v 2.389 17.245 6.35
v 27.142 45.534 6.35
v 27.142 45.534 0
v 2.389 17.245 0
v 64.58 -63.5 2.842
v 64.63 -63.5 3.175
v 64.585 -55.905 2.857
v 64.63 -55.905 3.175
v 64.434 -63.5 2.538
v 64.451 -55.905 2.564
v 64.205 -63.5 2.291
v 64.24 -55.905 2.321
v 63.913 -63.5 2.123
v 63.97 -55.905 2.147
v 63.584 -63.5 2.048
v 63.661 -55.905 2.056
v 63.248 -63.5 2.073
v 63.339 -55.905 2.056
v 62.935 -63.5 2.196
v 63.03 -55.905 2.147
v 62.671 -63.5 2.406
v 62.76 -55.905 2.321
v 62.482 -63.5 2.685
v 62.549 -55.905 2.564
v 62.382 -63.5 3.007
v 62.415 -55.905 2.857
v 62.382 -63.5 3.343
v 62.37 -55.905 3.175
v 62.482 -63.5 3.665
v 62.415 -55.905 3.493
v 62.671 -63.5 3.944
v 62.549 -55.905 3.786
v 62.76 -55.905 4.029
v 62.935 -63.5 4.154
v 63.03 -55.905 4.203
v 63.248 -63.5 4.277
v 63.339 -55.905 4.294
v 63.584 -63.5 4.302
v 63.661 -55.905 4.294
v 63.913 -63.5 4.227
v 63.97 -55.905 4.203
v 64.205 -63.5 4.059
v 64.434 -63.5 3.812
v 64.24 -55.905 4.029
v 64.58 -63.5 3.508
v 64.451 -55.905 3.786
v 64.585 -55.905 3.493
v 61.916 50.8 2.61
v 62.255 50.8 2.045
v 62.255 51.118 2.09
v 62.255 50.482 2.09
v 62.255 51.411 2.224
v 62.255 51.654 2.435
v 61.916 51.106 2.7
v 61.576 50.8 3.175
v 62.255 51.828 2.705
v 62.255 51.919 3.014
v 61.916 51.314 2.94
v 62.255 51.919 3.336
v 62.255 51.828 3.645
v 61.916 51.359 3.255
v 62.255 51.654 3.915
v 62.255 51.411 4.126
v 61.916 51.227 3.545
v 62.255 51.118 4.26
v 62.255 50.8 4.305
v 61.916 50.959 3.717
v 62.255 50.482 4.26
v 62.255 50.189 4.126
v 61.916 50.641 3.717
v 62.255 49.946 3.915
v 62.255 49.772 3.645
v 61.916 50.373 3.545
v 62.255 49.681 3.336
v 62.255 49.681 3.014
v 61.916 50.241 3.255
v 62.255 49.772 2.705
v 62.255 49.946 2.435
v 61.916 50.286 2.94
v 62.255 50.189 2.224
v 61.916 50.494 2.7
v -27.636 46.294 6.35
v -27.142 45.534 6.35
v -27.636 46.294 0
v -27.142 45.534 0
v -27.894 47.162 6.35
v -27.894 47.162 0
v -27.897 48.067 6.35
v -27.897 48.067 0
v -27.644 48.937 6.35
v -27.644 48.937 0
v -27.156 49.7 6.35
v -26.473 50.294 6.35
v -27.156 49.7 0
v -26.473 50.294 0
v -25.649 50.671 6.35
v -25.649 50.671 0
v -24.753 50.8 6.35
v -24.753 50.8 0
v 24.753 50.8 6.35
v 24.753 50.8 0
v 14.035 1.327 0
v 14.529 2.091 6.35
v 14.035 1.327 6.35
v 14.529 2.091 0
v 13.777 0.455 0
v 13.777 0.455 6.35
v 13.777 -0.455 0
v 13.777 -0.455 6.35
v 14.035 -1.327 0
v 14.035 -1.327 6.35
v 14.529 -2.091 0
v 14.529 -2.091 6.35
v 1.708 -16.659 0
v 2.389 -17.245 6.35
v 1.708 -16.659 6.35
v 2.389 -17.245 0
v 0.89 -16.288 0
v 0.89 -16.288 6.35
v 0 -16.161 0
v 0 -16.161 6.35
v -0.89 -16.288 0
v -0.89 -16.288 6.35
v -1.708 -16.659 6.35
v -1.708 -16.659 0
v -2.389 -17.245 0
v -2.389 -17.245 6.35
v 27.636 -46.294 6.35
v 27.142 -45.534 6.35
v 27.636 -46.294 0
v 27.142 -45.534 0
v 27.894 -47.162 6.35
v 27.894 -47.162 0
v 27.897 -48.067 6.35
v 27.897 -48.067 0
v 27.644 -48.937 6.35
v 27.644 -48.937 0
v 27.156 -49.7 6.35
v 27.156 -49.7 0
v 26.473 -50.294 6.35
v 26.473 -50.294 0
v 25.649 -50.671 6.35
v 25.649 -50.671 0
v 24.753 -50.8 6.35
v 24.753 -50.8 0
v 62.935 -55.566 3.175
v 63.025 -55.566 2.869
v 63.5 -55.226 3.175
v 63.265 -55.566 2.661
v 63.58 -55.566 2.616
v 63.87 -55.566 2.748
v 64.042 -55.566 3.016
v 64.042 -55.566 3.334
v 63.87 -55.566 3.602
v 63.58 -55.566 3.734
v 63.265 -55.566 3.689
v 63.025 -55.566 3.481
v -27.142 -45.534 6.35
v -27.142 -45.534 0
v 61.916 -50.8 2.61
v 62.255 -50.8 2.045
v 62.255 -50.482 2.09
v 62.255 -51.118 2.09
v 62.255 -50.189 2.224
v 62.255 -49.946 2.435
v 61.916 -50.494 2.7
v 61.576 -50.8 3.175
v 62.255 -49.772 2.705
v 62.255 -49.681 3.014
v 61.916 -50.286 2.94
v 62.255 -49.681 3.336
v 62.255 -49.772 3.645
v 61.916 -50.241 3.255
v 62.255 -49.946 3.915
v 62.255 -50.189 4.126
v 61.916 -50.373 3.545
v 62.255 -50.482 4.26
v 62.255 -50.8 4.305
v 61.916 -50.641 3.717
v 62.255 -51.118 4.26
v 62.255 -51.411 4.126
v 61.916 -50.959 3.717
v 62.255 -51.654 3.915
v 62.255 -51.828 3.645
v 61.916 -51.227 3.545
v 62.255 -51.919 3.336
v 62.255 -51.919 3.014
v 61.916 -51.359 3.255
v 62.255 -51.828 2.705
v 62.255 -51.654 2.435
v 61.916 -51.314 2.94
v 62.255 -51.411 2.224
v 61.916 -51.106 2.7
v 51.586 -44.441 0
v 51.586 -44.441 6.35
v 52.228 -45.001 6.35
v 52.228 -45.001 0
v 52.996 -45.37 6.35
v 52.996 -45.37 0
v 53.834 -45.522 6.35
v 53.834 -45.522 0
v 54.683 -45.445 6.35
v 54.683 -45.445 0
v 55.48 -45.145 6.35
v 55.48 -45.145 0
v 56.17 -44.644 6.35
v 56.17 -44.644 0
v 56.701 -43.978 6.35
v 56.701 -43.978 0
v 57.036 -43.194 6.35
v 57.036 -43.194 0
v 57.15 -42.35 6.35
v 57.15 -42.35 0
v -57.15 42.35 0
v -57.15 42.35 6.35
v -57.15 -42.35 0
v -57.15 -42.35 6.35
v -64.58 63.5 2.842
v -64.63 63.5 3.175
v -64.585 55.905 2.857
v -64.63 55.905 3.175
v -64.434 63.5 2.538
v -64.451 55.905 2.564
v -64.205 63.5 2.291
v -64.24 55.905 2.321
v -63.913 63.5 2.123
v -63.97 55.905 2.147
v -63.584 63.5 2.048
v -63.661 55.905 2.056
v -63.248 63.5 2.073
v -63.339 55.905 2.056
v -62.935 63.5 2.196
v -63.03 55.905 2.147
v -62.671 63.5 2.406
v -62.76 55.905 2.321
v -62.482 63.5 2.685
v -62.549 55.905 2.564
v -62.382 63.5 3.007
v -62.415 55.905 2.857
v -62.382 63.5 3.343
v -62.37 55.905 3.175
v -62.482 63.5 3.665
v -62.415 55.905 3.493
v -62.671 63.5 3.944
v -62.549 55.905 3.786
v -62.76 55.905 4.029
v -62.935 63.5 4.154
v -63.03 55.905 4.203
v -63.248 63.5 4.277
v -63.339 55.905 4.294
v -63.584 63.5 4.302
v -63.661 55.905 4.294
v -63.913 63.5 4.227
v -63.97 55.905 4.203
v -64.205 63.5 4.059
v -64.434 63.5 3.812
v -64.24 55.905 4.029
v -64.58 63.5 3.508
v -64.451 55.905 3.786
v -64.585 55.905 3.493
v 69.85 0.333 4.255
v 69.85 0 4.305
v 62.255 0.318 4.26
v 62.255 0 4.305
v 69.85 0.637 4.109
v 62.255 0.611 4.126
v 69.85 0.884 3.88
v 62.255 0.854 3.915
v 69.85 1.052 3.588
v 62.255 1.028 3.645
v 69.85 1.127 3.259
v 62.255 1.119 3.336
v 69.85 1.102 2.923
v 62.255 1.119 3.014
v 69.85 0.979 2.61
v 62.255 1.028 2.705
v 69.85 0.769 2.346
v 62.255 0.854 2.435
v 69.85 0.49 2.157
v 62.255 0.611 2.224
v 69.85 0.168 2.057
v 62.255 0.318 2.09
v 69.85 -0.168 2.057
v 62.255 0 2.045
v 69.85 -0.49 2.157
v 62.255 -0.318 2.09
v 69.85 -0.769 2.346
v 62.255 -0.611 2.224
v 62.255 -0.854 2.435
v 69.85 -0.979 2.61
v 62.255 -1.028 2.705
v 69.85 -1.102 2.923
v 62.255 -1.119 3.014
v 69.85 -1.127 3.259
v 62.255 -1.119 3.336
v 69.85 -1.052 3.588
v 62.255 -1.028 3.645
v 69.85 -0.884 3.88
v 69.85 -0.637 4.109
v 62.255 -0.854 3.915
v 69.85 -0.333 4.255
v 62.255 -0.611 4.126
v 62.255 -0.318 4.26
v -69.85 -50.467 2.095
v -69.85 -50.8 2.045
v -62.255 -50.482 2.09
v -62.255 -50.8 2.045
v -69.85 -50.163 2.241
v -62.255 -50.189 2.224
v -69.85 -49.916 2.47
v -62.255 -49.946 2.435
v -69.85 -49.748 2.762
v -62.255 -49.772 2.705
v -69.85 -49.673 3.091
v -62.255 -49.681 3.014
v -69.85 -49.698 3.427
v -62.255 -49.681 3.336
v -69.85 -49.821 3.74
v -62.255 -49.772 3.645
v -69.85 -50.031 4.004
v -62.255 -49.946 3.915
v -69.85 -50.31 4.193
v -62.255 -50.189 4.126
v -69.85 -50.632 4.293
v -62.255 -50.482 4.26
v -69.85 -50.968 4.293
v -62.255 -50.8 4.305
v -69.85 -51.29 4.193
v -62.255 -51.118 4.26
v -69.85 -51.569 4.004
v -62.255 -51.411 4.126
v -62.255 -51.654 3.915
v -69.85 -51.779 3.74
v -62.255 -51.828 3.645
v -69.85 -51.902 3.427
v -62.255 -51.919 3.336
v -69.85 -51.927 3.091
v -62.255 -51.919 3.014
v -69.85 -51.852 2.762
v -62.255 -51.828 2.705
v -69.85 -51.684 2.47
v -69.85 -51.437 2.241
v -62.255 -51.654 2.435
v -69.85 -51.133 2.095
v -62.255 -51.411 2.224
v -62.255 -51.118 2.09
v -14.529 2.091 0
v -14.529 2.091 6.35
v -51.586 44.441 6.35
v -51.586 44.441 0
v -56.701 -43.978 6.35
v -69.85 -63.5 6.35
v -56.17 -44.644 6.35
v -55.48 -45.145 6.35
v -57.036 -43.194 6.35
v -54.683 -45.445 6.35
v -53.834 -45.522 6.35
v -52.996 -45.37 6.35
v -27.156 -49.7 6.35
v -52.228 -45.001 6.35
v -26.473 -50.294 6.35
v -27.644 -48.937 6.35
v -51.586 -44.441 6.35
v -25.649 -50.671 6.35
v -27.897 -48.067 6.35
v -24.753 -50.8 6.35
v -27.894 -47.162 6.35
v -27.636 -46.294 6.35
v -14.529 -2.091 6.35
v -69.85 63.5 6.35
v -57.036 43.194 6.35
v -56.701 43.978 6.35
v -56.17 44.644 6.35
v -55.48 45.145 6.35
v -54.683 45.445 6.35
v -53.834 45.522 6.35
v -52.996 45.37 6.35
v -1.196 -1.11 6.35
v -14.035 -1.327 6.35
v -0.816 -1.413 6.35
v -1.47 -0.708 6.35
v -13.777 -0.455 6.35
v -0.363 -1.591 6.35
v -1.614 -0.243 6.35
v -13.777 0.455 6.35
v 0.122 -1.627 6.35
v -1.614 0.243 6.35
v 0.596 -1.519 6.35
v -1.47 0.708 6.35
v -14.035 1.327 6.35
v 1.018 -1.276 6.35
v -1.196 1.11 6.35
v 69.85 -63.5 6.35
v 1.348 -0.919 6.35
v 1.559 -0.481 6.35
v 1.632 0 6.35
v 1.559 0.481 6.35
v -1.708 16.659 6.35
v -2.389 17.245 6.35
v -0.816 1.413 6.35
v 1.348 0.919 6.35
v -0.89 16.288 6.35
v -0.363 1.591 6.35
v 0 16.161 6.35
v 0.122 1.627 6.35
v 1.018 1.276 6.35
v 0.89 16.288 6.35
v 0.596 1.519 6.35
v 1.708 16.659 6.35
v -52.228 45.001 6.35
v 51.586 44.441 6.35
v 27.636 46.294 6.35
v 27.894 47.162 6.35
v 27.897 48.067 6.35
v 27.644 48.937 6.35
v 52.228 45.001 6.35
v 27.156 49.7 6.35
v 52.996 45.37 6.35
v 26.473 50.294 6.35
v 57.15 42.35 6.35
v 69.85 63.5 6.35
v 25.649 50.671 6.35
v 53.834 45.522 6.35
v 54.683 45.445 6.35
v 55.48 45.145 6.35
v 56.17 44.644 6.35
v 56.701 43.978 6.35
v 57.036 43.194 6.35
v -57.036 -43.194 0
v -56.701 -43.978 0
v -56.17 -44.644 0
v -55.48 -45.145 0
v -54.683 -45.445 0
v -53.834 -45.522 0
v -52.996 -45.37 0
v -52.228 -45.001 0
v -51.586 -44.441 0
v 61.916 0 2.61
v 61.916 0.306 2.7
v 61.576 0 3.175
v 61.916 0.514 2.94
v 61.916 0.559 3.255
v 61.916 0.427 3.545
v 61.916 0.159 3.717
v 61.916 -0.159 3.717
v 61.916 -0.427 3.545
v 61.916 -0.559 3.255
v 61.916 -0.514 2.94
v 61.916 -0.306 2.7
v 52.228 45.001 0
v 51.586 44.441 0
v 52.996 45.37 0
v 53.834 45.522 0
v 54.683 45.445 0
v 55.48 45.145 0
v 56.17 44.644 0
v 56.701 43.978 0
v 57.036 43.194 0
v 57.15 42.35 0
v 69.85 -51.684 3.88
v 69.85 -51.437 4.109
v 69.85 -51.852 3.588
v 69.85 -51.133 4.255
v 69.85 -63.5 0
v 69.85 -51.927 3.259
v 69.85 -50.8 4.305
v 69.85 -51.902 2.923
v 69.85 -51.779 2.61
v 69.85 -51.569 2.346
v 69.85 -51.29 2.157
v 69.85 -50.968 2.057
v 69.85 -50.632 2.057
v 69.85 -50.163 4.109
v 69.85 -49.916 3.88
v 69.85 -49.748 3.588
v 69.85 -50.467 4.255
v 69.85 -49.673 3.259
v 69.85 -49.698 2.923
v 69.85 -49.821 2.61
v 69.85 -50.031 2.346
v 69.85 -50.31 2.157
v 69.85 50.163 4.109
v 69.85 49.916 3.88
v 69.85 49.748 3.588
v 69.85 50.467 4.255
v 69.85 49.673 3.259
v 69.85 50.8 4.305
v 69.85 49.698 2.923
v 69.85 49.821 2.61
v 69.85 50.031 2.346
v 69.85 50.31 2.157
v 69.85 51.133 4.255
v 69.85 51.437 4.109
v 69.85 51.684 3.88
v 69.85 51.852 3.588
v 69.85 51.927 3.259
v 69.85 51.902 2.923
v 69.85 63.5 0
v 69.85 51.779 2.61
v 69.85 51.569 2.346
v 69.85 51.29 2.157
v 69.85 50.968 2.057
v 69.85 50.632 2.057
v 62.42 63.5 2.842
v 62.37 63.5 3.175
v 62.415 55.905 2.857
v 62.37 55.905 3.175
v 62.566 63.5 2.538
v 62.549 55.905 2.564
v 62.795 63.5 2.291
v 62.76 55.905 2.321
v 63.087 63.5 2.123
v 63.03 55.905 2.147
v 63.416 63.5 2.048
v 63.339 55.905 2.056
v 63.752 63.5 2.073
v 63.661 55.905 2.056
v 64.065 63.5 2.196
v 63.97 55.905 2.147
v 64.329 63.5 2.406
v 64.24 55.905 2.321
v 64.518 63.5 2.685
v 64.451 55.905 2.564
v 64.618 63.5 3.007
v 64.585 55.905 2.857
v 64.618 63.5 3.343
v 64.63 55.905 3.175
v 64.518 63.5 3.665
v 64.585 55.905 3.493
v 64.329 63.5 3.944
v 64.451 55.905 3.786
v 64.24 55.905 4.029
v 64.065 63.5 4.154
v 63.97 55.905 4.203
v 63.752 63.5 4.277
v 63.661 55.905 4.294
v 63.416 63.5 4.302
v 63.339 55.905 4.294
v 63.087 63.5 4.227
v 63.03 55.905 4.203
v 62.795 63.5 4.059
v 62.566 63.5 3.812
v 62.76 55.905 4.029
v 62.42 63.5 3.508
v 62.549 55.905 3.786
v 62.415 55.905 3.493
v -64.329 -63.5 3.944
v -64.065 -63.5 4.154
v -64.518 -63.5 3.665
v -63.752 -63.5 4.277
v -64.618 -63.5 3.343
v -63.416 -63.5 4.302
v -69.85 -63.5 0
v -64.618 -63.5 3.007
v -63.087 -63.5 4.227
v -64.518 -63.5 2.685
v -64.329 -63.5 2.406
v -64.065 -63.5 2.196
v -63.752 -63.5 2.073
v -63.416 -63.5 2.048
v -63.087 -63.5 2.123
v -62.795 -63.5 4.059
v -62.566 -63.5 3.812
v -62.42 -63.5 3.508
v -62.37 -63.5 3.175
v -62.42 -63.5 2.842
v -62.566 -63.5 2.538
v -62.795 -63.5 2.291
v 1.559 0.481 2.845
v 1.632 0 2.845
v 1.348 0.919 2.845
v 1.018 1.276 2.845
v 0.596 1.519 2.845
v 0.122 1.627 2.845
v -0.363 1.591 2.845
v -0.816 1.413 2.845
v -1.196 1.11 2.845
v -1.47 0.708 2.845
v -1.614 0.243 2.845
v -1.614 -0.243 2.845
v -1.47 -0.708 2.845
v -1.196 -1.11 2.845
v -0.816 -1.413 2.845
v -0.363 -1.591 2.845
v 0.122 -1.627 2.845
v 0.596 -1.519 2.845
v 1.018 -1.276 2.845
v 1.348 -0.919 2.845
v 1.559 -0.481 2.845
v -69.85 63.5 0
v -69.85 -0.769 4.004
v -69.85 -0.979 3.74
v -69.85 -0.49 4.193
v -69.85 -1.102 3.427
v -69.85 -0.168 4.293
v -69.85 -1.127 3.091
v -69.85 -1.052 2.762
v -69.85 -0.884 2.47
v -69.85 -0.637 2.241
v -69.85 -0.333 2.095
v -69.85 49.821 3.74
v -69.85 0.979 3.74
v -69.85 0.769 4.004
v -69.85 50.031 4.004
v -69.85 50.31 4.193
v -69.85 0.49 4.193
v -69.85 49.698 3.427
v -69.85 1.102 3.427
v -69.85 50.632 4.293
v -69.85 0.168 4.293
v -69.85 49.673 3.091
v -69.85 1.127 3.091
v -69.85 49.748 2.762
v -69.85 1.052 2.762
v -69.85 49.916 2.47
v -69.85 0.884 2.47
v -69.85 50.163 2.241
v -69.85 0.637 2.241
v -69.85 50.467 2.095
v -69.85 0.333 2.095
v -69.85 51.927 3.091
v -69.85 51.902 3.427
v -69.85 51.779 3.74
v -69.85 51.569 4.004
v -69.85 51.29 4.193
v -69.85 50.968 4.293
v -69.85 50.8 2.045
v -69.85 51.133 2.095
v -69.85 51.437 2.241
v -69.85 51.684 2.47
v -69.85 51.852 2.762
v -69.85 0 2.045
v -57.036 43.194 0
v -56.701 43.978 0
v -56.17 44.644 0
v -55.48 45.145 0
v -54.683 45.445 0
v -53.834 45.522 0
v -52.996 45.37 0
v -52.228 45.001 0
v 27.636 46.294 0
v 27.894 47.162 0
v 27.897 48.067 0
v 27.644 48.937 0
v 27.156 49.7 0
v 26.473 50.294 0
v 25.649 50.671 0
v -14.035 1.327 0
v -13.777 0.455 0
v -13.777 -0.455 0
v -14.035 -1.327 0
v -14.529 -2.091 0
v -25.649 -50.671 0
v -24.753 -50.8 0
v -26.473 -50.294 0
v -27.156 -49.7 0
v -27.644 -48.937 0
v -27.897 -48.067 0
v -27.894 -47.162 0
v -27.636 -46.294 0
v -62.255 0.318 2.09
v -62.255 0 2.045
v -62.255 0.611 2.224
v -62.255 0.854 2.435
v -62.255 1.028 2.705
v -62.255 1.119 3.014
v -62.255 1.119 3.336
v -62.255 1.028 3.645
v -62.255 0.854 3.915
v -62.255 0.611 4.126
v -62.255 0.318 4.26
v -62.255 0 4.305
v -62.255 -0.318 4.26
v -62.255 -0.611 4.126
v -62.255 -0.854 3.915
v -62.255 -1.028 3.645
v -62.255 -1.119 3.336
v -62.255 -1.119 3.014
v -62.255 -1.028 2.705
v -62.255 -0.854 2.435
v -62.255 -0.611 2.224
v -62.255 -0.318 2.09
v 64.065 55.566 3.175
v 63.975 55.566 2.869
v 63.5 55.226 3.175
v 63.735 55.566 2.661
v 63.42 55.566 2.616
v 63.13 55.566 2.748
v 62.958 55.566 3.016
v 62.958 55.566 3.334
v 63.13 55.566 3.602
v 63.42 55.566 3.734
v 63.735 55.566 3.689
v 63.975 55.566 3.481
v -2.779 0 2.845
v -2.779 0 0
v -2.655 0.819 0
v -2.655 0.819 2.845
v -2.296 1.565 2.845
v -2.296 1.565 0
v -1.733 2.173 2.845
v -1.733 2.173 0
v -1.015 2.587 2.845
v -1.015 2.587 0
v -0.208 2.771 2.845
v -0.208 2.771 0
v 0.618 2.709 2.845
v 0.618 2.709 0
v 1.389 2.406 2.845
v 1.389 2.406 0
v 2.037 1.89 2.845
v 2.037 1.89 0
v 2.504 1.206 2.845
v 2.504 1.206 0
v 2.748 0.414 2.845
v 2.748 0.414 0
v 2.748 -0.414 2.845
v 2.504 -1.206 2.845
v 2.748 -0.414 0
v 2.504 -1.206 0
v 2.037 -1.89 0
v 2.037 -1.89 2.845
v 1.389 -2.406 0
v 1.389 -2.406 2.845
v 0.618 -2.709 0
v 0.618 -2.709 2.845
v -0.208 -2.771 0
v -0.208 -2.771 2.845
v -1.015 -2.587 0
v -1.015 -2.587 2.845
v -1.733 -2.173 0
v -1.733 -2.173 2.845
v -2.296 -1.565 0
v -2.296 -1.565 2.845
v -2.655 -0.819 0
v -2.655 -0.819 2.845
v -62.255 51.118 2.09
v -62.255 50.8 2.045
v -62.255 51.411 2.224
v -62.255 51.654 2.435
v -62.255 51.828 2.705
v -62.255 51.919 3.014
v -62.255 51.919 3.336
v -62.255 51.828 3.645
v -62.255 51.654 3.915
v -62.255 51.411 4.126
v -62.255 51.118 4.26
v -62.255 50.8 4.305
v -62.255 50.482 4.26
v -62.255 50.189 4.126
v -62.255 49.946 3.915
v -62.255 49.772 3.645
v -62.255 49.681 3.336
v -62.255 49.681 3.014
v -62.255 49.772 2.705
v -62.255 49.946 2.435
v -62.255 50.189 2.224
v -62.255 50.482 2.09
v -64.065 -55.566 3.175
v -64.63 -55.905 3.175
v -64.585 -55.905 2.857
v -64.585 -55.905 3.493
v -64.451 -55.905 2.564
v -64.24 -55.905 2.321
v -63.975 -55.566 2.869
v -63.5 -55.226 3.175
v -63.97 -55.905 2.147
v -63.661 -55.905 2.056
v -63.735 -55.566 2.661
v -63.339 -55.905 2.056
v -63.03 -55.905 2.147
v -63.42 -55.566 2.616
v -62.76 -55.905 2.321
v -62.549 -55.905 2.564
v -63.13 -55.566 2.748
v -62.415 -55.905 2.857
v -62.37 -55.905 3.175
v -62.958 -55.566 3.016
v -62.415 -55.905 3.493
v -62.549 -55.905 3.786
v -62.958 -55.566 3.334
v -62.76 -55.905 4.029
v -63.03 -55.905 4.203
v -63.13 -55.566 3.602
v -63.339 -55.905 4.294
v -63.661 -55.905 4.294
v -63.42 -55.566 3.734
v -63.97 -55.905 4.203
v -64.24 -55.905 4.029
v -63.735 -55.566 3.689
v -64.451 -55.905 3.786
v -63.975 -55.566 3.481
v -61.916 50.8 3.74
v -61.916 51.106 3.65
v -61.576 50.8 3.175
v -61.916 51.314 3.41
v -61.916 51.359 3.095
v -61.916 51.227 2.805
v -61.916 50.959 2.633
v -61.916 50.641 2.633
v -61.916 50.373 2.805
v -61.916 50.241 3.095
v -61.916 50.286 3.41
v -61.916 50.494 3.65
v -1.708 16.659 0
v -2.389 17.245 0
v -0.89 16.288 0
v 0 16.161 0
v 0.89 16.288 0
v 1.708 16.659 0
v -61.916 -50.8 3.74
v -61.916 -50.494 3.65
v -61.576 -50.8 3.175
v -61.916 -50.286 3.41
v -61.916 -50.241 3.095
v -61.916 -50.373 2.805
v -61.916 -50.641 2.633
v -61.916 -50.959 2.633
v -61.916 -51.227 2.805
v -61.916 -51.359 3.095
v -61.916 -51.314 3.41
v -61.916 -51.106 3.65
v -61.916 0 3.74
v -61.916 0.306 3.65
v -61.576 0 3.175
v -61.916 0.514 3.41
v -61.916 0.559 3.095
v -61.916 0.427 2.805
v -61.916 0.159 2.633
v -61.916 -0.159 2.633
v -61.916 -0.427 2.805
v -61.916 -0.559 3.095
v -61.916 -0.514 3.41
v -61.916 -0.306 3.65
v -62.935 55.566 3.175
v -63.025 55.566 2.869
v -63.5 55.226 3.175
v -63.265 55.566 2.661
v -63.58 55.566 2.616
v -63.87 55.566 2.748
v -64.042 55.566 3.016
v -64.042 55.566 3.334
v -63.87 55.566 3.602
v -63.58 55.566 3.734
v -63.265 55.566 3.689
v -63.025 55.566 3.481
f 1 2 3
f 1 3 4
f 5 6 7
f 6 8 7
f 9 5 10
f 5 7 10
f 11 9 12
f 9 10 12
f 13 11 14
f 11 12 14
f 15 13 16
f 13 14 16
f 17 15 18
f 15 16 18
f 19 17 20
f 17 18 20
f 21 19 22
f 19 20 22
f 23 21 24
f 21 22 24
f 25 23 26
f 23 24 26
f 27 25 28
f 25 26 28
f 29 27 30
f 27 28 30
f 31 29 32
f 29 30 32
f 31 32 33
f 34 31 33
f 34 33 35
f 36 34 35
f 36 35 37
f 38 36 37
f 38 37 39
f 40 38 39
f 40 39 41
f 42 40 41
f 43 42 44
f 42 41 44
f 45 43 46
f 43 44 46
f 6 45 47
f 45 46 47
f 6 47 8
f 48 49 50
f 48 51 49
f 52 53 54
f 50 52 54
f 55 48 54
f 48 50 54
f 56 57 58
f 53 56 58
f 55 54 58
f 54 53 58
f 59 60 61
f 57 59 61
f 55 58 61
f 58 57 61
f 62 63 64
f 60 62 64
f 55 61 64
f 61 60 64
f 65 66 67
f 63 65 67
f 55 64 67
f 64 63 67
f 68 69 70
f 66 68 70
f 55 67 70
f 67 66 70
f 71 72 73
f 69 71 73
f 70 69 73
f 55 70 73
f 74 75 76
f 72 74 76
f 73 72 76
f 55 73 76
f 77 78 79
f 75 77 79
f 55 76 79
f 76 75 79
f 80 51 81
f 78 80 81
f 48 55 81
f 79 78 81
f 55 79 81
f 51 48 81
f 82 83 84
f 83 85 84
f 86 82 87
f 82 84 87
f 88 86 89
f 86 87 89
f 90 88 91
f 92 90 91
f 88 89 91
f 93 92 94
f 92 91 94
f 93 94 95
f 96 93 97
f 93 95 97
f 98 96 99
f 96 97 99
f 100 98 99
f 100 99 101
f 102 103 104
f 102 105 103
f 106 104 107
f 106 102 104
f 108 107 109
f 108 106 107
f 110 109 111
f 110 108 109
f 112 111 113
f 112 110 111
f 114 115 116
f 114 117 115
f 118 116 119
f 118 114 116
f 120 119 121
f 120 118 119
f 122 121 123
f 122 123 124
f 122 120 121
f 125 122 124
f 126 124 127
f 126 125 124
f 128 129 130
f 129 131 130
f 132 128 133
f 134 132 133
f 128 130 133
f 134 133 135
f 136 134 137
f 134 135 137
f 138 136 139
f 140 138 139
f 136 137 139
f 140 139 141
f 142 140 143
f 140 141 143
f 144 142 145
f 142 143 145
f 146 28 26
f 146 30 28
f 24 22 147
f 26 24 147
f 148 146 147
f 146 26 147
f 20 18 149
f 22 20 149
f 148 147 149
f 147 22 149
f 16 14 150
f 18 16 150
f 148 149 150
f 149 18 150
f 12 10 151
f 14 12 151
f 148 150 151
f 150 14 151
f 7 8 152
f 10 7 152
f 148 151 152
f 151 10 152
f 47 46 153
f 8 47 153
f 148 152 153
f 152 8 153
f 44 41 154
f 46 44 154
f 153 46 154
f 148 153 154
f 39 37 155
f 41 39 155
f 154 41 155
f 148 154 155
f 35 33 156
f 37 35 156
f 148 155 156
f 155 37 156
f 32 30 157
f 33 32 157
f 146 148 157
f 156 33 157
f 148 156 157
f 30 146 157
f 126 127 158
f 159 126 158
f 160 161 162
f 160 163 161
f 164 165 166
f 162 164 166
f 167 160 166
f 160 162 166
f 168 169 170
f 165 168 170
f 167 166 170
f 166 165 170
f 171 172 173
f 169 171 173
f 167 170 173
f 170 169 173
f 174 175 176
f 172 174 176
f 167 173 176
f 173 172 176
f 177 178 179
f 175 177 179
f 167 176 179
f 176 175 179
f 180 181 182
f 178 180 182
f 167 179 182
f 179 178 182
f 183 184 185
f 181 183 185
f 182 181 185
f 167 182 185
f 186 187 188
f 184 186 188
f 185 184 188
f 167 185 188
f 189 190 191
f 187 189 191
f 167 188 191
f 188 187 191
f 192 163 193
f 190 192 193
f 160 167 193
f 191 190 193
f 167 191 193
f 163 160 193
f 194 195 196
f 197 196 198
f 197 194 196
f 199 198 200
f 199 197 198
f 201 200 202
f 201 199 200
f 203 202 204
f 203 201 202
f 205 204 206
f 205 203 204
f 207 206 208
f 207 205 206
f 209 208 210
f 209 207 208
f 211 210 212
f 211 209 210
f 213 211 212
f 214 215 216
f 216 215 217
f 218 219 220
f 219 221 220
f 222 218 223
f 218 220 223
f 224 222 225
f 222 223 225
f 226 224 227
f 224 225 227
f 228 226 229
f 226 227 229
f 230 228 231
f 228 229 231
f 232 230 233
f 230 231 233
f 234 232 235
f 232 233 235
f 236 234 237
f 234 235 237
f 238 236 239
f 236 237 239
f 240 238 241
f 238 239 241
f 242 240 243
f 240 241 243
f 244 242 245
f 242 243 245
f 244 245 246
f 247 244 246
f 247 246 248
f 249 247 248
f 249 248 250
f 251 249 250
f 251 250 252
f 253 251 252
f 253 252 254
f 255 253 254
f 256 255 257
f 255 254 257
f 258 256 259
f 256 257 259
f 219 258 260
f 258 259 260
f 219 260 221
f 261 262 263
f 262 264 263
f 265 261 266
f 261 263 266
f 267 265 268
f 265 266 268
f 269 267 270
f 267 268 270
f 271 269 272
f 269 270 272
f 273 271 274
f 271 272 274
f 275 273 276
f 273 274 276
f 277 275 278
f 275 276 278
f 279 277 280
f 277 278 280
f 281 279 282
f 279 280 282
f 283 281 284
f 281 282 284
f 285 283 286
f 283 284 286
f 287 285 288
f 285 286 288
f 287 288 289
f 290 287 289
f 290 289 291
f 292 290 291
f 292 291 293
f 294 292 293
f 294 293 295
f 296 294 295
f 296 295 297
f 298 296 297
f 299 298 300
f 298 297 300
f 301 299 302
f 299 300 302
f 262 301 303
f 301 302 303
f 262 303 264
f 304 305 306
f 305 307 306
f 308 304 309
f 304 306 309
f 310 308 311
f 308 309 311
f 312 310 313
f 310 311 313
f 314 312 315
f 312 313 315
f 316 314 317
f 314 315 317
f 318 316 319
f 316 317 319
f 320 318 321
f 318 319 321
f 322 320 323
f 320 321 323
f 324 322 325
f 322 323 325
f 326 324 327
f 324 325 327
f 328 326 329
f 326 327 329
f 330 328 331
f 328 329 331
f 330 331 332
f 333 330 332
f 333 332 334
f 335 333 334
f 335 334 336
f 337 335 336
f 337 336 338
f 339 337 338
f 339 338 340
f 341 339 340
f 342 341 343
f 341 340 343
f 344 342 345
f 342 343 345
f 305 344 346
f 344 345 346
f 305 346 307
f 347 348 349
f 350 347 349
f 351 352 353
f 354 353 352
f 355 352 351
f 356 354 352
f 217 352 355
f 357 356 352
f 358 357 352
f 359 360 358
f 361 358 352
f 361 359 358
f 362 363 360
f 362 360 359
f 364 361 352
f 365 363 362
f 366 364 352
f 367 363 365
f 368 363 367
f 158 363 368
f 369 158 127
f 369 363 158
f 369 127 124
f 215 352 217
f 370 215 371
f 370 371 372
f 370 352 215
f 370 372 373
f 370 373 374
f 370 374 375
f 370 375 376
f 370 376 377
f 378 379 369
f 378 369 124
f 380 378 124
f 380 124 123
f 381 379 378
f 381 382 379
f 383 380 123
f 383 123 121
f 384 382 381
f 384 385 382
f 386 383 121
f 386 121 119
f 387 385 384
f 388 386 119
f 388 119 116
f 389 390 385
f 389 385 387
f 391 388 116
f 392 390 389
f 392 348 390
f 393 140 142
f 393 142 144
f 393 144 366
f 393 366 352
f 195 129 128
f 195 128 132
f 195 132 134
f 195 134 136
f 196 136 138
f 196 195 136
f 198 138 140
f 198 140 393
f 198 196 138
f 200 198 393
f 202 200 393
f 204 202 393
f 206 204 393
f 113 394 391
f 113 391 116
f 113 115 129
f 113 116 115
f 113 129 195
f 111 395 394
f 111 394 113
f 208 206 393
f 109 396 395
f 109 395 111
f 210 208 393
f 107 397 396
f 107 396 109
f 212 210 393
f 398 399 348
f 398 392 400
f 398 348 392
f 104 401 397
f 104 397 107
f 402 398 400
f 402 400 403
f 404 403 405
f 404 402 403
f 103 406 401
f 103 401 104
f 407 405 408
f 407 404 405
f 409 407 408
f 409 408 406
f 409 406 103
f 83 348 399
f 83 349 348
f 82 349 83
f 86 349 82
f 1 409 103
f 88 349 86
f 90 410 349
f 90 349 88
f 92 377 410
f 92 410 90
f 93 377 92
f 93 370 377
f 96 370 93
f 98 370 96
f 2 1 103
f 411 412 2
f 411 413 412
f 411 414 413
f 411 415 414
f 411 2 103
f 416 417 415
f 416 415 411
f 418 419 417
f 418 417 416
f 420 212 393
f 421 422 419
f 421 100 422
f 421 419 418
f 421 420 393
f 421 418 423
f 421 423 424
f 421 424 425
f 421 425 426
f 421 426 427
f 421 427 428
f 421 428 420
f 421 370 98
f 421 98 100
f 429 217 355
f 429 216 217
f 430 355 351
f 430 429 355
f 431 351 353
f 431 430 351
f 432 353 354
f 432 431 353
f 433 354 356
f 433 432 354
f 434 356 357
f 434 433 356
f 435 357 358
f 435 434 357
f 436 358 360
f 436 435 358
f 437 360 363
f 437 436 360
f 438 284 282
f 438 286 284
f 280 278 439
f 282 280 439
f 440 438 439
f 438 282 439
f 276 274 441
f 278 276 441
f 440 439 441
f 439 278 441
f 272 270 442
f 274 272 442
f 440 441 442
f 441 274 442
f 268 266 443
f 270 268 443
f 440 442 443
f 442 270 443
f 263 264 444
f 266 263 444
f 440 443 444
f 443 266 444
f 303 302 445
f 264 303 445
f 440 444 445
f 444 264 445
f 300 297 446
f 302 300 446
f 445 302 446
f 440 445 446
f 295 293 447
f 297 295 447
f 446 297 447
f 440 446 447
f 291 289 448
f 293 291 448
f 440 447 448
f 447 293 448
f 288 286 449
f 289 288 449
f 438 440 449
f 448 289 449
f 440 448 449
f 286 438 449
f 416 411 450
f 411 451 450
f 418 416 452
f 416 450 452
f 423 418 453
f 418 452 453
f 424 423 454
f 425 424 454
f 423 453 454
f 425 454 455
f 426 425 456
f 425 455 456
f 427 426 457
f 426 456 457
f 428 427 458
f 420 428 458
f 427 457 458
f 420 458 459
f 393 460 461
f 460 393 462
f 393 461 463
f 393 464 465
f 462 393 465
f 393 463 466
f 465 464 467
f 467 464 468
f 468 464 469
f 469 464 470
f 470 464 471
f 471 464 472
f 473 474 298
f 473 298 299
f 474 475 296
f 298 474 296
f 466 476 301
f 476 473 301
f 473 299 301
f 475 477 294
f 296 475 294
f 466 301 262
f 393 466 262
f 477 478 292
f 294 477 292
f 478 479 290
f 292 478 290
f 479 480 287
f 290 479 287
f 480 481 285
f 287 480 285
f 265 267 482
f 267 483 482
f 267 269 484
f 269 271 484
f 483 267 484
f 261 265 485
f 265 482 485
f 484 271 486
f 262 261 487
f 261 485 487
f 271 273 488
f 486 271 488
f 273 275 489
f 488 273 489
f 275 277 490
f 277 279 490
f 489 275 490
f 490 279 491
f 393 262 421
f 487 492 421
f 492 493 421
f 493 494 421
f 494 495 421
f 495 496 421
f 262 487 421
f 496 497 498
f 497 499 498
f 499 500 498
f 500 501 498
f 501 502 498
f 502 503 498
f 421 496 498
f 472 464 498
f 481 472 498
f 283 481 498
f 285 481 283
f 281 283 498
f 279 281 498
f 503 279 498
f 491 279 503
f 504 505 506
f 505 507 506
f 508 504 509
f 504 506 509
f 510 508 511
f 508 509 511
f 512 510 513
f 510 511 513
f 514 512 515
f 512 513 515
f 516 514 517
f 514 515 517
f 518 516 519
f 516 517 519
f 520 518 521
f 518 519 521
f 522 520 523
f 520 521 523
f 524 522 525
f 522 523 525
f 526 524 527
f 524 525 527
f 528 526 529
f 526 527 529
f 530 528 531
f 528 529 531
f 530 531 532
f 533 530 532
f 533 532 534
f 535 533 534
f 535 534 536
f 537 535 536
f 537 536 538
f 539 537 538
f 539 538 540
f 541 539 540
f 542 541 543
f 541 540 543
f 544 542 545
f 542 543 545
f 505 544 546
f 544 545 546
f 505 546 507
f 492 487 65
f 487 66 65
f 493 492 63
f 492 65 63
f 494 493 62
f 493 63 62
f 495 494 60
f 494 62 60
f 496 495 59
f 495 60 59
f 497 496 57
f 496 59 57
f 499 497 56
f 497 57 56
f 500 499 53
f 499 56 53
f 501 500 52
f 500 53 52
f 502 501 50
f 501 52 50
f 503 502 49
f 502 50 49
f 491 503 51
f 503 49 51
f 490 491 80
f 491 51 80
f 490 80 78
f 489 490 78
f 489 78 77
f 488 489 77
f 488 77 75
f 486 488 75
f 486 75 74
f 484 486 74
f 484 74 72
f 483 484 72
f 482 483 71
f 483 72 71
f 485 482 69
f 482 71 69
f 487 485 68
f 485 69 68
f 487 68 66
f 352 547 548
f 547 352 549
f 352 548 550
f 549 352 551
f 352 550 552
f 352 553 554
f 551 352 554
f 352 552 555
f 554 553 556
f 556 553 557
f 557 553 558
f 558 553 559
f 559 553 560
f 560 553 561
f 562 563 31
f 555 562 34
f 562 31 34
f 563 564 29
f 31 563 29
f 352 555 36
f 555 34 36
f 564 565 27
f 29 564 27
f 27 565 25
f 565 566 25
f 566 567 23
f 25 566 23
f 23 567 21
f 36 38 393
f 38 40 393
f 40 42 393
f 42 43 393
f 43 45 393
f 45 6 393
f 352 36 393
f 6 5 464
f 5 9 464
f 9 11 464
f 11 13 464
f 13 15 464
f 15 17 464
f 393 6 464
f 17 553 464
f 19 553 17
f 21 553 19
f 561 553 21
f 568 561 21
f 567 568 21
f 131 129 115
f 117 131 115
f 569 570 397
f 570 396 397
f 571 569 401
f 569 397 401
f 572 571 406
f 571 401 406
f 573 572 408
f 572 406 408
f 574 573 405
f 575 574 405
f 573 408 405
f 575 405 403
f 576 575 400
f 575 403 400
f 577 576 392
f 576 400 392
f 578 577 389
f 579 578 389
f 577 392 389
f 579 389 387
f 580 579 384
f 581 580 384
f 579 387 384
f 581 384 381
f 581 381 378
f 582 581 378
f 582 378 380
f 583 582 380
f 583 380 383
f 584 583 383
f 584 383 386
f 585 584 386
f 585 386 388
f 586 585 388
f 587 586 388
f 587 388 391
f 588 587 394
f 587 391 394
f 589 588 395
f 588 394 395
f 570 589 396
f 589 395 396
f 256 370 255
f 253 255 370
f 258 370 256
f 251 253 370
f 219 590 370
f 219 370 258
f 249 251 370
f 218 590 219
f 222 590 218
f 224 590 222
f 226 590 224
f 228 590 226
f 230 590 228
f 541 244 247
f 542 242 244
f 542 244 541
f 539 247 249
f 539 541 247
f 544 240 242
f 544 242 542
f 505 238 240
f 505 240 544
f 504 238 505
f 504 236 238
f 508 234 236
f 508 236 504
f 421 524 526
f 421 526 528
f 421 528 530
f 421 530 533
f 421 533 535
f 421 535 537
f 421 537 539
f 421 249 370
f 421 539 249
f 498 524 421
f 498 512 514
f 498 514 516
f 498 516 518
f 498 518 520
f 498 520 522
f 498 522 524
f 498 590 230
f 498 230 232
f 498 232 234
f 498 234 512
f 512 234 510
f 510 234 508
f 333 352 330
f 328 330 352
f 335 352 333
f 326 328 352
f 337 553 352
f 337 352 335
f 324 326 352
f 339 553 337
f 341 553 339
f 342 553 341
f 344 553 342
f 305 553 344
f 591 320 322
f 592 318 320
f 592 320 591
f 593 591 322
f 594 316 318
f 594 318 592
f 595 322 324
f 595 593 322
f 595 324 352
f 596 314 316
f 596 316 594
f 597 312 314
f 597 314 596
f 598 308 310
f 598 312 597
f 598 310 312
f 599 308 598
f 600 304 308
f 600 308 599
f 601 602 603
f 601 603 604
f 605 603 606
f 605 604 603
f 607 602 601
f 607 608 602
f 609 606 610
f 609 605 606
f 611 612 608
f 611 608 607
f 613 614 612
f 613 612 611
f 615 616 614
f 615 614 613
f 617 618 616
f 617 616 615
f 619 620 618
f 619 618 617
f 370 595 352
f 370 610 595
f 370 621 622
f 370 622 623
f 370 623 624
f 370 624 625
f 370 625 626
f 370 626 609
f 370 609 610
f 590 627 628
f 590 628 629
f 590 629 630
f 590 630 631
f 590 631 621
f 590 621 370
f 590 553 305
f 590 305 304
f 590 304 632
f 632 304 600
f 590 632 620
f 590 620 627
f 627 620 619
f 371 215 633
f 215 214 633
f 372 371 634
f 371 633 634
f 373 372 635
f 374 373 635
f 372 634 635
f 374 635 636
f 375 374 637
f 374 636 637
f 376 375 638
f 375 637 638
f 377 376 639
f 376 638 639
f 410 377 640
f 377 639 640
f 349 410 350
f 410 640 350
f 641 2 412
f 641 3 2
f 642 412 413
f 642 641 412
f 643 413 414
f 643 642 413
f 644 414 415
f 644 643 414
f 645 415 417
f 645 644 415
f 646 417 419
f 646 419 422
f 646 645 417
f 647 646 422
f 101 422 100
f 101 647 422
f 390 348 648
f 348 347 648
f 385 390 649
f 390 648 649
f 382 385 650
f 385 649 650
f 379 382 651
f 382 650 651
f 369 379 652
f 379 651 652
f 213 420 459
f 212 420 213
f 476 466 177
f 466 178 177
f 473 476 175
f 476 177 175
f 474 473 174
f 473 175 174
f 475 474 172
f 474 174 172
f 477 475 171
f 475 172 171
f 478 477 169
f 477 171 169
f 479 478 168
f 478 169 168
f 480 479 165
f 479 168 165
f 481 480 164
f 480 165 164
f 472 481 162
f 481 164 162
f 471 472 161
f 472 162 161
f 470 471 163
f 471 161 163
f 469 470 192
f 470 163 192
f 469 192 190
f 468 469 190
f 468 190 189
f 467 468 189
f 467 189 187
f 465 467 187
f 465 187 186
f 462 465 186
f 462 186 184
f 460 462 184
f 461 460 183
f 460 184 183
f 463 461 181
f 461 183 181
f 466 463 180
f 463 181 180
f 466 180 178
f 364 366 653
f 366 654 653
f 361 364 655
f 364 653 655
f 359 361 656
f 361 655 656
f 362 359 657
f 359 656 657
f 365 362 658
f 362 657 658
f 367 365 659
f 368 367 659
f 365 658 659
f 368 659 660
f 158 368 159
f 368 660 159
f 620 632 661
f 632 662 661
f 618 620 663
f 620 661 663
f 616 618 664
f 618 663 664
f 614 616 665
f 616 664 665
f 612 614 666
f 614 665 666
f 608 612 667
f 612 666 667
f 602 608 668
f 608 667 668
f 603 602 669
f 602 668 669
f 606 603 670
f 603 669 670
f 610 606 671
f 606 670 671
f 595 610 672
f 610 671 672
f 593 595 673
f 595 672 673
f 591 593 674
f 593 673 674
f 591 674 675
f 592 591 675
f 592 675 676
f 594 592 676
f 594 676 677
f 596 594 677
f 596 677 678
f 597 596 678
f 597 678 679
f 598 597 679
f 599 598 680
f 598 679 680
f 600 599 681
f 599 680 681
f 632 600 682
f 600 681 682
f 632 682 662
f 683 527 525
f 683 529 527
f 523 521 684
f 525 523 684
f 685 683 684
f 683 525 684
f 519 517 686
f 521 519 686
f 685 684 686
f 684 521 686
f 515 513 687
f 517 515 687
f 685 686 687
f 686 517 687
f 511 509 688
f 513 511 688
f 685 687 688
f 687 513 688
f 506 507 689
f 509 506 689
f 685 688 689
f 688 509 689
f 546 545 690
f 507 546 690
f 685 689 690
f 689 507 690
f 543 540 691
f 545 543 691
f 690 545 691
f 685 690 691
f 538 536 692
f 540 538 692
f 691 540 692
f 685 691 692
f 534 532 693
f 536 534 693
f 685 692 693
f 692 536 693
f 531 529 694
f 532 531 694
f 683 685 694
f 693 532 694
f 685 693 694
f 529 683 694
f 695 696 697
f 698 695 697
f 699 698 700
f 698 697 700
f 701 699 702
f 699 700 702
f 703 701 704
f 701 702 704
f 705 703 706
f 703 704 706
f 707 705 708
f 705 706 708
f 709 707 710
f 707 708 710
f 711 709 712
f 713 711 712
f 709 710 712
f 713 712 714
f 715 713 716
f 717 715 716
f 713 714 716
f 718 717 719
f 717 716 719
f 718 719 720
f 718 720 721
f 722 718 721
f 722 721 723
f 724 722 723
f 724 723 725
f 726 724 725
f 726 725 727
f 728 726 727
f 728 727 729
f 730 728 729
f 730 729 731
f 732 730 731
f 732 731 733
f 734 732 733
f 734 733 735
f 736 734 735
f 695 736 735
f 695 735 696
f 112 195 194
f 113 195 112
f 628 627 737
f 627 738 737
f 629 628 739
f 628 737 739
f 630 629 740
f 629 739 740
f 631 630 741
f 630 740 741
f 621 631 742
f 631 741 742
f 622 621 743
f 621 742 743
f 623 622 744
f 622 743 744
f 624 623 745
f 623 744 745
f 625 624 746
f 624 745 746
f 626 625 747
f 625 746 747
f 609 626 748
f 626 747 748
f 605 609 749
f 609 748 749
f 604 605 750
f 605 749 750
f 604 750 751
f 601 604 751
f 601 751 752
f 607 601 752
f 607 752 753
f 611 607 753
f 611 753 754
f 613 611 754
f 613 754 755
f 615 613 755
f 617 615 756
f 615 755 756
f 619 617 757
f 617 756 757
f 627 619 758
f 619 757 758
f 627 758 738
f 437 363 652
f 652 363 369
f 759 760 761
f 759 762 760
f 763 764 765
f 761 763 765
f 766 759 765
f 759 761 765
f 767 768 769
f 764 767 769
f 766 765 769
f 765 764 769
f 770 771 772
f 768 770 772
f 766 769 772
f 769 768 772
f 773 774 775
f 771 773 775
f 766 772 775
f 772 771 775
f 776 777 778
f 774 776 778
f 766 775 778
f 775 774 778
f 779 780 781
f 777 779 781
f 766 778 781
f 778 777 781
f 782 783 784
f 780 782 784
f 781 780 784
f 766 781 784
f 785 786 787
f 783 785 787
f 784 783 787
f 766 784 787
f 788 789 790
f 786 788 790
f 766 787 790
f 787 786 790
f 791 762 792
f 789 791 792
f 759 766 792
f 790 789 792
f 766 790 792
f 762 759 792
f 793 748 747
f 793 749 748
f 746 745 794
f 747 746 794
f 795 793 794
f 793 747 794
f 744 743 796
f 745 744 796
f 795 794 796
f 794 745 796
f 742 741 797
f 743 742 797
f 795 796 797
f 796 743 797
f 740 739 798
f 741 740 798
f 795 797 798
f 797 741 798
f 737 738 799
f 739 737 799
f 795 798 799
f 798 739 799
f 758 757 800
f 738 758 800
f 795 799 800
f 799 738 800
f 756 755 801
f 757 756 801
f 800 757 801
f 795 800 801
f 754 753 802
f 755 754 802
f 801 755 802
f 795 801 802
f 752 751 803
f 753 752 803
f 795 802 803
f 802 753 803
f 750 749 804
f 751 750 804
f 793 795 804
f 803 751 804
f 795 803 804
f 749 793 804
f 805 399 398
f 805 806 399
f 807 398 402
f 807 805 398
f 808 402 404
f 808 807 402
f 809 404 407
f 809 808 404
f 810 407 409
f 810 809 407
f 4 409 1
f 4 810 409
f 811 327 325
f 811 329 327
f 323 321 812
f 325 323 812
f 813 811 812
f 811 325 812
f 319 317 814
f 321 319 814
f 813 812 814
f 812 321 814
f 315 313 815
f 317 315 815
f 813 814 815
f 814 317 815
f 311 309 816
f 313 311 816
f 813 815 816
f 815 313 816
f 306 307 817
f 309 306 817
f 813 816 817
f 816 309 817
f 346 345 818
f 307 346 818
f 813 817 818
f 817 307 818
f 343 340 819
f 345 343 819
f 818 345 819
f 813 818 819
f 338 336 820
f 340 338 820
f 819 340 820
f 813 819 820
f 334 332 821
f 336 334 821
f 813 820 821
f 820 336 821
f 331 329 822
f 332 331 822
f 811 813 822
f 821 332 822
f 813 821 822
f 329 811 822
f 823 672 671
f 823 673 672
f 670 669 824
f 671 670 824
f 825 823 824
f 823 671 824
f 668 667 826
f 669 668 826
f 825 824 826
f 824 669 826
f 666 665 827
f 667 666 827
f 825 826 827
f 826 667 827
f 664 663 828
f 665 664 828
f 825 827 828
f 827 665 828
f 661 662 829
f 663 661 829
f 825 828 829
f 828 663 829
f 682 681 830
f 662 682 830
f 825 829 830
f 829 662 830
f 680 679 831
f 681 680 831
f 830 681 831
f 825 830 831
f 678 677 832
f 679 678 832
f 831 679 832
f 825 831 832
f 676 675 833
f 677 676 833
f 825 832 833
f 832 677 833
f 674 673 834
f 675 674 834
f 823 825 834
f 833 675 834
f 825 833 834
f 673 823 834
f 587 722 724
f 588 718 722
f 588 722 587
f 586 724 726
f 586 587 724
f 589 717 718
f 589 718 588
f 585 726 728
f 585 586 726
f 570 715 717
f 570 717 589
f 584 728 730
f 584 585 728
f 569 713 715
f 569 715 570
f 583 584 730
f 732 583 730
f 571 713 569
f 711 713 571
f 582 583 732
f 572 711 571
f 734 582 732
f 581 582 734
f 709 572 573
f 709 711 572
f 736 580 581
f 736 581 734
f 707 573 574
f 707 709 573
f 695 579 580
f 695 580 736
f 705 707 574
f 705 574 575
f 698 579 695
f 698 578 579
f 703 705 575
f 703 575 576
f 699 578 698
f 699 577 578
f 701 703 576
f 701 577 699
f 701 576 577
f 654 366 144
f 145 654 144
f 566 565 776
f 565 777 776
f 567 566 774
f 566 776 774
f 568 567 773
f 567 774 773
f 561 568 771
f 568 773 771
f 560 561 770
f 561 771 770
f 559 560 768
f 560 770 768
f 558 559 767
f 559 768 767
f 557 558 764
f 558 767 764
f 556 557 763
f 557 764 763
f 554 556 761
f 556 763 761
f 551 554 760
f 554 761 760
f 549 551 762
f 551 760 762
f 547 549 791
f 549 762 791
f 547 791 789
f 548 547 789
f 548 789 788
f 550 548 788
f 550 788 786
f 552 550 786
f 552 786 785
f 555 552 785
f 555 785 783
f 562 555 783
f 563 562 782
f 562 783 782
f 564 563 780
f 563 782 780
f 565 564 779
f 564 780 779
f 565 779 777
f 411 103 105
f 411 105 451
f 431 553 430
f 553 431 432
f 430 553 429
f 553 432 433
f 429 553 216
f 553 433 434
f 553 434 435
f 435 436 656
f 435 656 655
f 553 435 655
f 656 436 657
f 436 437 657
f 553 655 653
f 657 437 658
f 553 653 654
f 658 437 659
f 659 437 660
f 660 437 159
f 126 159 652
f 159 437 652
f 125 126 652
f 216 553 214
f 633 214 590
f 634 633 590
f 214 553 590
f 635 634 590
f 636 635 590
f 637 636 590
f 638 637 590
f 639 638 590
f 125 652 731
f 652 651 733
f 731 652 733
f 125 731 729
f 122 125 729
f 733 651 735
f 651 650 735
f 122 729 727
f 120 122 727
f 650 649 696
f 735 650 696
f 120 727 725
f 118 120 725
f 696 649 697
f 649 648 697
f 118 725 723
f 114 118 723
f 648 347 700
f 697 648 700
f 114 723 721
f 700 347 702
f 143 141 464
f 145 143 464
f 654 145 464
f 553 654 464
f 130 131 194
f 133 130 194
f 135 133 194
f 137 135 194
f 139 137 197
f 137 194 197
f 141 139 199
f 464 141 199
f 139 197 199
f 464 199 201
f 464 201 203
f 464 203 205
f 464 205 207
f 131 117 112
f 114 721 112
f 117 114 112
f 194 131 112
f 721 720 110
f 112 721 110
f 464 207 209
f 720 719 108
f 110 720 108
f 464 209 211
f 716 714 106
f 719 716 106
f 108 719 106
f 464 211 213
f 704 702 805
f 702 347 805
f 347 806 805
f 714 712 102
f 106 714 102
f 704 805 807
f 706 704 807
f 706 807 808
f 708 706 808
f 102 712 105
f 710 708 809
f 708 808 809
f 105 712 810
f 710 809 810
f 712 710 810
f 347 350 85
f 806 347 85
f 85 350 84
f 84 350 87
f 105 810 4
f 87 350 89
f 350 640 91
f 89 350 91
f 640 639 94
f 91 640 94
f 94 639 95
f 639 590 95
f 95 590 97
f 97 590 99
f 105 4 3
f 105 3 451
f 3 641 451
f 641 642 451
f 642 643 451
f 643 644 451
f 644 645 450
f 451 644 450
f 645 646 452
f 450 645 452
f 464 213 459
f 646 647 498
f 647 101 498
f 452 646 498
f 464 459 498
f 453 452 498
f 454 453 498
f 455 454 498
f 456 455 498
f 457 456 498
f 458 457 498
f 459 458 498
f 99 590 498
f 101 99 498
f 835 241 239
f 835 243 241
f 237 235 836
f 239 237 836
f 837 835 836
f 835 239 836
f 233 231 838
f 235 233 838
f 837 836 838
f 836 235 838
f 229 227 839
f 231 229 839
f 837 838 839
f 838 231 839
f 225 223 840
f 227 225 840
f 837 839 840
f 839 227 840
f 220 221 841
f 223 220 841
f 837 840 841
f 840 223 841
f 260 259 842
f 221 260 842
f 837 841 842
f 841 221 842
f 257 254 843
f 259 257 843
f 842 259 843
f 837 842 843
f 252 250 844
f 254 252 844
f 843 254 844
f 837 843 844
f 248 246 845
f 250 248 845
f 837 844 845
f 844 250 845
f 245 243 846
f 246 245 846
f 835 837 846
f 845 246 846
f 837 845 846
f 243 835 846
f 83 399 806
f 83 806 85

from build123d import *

# Parameters (mm, degrees)
SKETCH1_W                                      = 139.7
SKETCH1_H                                      = 127
BOSS_EXTRUDE1_DEPTH                            = 6.35
CUT_EXTRUDE1_DEPTH                             = 7.35
F_4_40_TAPPED_HOLE1_D                          = 2.2606
F_4_40_TAPPED_HOLE1_DEPTH                      = 7.5946
F_4_40_TAPPED_HOLE1_TIP                        = 0.679152758
F_4_40_TAPPED_HOLE2_D                          = 2.2606
F_4_40_TAPPED_HOLE2_DEPTH                      = 7.5946
F_4_40_TAPPED_HOLE2_TIP                        = 0.679152758
F_4_40_TAPPED_HOLE3_D                          = 2.2606
F_4_40_TAPPED_HOLE3_DEPTH                      = 7.5946
F_4_40_TAPPED_HOLE3_TIP                        = 0.679152758
CBORE_FOR_4_SOCKET_HEAD_CAP_SCREW1_D           = 3.2639
CBORE_FOR_4_SOCKET_HEAD_CAP_SCREW1_DEPTH       = 7.5946
CBORE_FOR_4_SOCKET_HEAD_CAP_SCREW1_CBORE_D     = 5.55752
CBORE_FOR_4_SOCKET_HEAD_CAP_SCREW1_CBORE_DEPTH = 2.8448
CBORE_FOR_4_SOCKET_HEAD_CAP_SCREW1_TIP         = 0.980574487
F_4_40_TAPPED_HOLE4_D                          = 2.2606
F_4_40_TAPPED_HOLE4_DEPTH                      = 7.5946
F_4_40_TAPPED_HOLE4_TIP                        = 0.679152758
FILLET1_R                                      = 3.175


with BuildPart() as part:
    # Sketch1 → Boss-Extrude1 (new body)
    with BuildSketch(Plane.XY):
        Rectangle(SKETCH1_W, SKETCH1_H)
    extrude(amount=BOSS_EXTRUDE1_DEPTH)

    # Sketch2 → Cut-Extrude1 (cut, through all)
    with BuildSketch(Plane.XY.offset(6.35)):
        Polygon((-57.15, 50.8), (-57.15, -50.8), (-12.7, 0), align=None)
        Polygon((57.15, 50.8), (57.15, -50.8), (12.7, 0), align=None)
        Polygon((-31.75, 50.8), (31.75, 50.8), (0, 14.514285714), align=None)
        Polygon((31.75, -50.8), (0, -14.514285714), (-31.75, -50.8), align=None)
    extrude(amount=-CUT_EXTRUDE1_DEPTH, mode=Mode.SUBTRACT)

    # #4-40 Tapped Hole1
    with Locations(Plane(origin=(0, -63.5, 0), x_dir=(-1, 0, 0), z_dir=(0, -1, 0))):
        with Locations((-63.5, -3.175), (63.5, -3.175)):
            Hole(F_4_40_TAPPED_HOLE1_D / 2, depth=F_4_40_TAPPED_HOLE1_DEPTH)
            with Locations((0, 0, -(F_4_40_TAPPED_HOLE1_DEPTH + F_4_40_TAPPED_HOLE1_TIP / 2))):  # 118° drill point
                Cone(0, F_4_40_TAPPED_HOLE1_D / 2, F_4_40_TAPPED_HOLE1_TIP, mode=Mode.SUBTRACT)

    # #4-40 Tapped Hole2
    with Locations(Plane.ZY.offset(69.85)):
        with Locations((3.175, 0), (3.175, 50.8), (3.175, -50.8)):
            Hole(F_4_40_TAPPED_HOLE2_D / 2, depth=F_4_40_TAPPED_HOLE2_DEPTH)
            with Locations((0, 0, -(F_4_40_TAPPED_HOLE2_DEPTH + F_4_40_TAPPED_HOLE2_TIP / 2))):  # 118° drill point
                Cone(0, F_4_40_TAPPED_HOLE2_D / 2, F_4_40_TAPPED_HOLE2_TIP, mode=Mode.SUBTRACT)

    # #4-40 Tapped Hole3
    with Locations(Plane(origin=(69.85, 0, 0), x_dir=(0, 0, -1), z_dir=(1, 0, 0))):
        with Locations((-3.175, 50.8), (-3.175, 0), (-3.175, -50.8)):
            Hole(F_4_40_TAPPED_HOLE3_D / 2, depth=F_4_40_TAPPED_HOLE3_DEPTH)
            with Locations((0, 0, -(F_4_40_TAPPED_HOLE3_DEPTH + F_4_40_TAPPED_HOLE3_TIP / 2))):  # 118° drill point
                Cone(0, F_4_40_TAPPED_HOLE3_D / 2, F_4_40_TAPPED_HOLE3_TIP, mode=Mode.SUBTRACT)

    # CBORE for #4 Socket Head Cap Screw1
    with Locations(Plane(origin=(0, 0, 0), x_dir=(-1, 0, 0), z_dir=(0, 0, -1))):
        with Locations((0, 0)):
            CounterBoreHole(CBORE_FOR_4_SOCKET_HEAD_CAP_SCREW1_D / 2, CBORE_FOR_4_SOCKET_HEAD_CAP_SCREW1_CBORE_D / 2, CBORE_FOR_4_SOCKET_HEAD_CAP_SCREW1_CBORE_DEPTH, depth=CBORE_FOR_4_SOCKET_HEAD_CAP_SCREW1_DEPTH)
            with Locations((0, 0, -(CBORE_FOR_4_SOCKET_HEAD_CAP_SCREW1_DEPTH + CBORE_FOR_4_SOCKET_HEAD_CAP_SCREW1_TIP / 2))):  # 118° drill point
                Cone(0, CBORE_FOR_4_SOCKET_HEAD_CAP_SCREW1_D / 2, CBORE_FOR_4_SOCKET_HEAD_CAP_SCREW1_TIP, mode=Mode.SUBTRACT)

    # #4-40 Tapped Hole4
    with Locations(Plane(origin=(0, 63.5, 0), x_dir=(1, 0, 0), z_dir=(0, 1, 0))):
        with Locations((-63.5, -3.175), (63.5, -3.175)):
            Hole(F_4_40_TAPPED_HOLE4_D / 2, depth=F_4_40_TAPPED_HOLE4_DEPTH)
            with Locations((0, 0, -(F_4_40_TAPPED_HOLE4_DEPTH + F_4_40_TAPPED_HOLE4_TIP / 2))):  # 118° drill point
                Cone(0, F_4_40_TAPPED_HOLE4_D / 2, F_4_40_TAPPED_HOLE4_TIP, mode=Mode.SUBTRACT)

    # Fillet1
    fillet1_edges = [part.edges().sort_by_distance(p)[0] for p in [
        (0, 14.514285714, 3.175),
        (-31.75, 50.8, 3.175),
        (31.75, 50.8, 3.175),
        (31.75, -50.8, 3.175),
        (-31.75, -50.8, 3.175),
        (0, -14.514285714, 3.175),
        (12.7, 0, 3.175),
        (57.15, 50.8, 3.175),
        (57.15, -50.8, 3.175),
        (-57.15, 50.8, 3.175),
        (-12.7, 0, 3.175),
        (-57.15, -50.8, 3.175),
    ]]
    fillet(fillet1_edges, radius=FILLET1_R)


solid = part.part
